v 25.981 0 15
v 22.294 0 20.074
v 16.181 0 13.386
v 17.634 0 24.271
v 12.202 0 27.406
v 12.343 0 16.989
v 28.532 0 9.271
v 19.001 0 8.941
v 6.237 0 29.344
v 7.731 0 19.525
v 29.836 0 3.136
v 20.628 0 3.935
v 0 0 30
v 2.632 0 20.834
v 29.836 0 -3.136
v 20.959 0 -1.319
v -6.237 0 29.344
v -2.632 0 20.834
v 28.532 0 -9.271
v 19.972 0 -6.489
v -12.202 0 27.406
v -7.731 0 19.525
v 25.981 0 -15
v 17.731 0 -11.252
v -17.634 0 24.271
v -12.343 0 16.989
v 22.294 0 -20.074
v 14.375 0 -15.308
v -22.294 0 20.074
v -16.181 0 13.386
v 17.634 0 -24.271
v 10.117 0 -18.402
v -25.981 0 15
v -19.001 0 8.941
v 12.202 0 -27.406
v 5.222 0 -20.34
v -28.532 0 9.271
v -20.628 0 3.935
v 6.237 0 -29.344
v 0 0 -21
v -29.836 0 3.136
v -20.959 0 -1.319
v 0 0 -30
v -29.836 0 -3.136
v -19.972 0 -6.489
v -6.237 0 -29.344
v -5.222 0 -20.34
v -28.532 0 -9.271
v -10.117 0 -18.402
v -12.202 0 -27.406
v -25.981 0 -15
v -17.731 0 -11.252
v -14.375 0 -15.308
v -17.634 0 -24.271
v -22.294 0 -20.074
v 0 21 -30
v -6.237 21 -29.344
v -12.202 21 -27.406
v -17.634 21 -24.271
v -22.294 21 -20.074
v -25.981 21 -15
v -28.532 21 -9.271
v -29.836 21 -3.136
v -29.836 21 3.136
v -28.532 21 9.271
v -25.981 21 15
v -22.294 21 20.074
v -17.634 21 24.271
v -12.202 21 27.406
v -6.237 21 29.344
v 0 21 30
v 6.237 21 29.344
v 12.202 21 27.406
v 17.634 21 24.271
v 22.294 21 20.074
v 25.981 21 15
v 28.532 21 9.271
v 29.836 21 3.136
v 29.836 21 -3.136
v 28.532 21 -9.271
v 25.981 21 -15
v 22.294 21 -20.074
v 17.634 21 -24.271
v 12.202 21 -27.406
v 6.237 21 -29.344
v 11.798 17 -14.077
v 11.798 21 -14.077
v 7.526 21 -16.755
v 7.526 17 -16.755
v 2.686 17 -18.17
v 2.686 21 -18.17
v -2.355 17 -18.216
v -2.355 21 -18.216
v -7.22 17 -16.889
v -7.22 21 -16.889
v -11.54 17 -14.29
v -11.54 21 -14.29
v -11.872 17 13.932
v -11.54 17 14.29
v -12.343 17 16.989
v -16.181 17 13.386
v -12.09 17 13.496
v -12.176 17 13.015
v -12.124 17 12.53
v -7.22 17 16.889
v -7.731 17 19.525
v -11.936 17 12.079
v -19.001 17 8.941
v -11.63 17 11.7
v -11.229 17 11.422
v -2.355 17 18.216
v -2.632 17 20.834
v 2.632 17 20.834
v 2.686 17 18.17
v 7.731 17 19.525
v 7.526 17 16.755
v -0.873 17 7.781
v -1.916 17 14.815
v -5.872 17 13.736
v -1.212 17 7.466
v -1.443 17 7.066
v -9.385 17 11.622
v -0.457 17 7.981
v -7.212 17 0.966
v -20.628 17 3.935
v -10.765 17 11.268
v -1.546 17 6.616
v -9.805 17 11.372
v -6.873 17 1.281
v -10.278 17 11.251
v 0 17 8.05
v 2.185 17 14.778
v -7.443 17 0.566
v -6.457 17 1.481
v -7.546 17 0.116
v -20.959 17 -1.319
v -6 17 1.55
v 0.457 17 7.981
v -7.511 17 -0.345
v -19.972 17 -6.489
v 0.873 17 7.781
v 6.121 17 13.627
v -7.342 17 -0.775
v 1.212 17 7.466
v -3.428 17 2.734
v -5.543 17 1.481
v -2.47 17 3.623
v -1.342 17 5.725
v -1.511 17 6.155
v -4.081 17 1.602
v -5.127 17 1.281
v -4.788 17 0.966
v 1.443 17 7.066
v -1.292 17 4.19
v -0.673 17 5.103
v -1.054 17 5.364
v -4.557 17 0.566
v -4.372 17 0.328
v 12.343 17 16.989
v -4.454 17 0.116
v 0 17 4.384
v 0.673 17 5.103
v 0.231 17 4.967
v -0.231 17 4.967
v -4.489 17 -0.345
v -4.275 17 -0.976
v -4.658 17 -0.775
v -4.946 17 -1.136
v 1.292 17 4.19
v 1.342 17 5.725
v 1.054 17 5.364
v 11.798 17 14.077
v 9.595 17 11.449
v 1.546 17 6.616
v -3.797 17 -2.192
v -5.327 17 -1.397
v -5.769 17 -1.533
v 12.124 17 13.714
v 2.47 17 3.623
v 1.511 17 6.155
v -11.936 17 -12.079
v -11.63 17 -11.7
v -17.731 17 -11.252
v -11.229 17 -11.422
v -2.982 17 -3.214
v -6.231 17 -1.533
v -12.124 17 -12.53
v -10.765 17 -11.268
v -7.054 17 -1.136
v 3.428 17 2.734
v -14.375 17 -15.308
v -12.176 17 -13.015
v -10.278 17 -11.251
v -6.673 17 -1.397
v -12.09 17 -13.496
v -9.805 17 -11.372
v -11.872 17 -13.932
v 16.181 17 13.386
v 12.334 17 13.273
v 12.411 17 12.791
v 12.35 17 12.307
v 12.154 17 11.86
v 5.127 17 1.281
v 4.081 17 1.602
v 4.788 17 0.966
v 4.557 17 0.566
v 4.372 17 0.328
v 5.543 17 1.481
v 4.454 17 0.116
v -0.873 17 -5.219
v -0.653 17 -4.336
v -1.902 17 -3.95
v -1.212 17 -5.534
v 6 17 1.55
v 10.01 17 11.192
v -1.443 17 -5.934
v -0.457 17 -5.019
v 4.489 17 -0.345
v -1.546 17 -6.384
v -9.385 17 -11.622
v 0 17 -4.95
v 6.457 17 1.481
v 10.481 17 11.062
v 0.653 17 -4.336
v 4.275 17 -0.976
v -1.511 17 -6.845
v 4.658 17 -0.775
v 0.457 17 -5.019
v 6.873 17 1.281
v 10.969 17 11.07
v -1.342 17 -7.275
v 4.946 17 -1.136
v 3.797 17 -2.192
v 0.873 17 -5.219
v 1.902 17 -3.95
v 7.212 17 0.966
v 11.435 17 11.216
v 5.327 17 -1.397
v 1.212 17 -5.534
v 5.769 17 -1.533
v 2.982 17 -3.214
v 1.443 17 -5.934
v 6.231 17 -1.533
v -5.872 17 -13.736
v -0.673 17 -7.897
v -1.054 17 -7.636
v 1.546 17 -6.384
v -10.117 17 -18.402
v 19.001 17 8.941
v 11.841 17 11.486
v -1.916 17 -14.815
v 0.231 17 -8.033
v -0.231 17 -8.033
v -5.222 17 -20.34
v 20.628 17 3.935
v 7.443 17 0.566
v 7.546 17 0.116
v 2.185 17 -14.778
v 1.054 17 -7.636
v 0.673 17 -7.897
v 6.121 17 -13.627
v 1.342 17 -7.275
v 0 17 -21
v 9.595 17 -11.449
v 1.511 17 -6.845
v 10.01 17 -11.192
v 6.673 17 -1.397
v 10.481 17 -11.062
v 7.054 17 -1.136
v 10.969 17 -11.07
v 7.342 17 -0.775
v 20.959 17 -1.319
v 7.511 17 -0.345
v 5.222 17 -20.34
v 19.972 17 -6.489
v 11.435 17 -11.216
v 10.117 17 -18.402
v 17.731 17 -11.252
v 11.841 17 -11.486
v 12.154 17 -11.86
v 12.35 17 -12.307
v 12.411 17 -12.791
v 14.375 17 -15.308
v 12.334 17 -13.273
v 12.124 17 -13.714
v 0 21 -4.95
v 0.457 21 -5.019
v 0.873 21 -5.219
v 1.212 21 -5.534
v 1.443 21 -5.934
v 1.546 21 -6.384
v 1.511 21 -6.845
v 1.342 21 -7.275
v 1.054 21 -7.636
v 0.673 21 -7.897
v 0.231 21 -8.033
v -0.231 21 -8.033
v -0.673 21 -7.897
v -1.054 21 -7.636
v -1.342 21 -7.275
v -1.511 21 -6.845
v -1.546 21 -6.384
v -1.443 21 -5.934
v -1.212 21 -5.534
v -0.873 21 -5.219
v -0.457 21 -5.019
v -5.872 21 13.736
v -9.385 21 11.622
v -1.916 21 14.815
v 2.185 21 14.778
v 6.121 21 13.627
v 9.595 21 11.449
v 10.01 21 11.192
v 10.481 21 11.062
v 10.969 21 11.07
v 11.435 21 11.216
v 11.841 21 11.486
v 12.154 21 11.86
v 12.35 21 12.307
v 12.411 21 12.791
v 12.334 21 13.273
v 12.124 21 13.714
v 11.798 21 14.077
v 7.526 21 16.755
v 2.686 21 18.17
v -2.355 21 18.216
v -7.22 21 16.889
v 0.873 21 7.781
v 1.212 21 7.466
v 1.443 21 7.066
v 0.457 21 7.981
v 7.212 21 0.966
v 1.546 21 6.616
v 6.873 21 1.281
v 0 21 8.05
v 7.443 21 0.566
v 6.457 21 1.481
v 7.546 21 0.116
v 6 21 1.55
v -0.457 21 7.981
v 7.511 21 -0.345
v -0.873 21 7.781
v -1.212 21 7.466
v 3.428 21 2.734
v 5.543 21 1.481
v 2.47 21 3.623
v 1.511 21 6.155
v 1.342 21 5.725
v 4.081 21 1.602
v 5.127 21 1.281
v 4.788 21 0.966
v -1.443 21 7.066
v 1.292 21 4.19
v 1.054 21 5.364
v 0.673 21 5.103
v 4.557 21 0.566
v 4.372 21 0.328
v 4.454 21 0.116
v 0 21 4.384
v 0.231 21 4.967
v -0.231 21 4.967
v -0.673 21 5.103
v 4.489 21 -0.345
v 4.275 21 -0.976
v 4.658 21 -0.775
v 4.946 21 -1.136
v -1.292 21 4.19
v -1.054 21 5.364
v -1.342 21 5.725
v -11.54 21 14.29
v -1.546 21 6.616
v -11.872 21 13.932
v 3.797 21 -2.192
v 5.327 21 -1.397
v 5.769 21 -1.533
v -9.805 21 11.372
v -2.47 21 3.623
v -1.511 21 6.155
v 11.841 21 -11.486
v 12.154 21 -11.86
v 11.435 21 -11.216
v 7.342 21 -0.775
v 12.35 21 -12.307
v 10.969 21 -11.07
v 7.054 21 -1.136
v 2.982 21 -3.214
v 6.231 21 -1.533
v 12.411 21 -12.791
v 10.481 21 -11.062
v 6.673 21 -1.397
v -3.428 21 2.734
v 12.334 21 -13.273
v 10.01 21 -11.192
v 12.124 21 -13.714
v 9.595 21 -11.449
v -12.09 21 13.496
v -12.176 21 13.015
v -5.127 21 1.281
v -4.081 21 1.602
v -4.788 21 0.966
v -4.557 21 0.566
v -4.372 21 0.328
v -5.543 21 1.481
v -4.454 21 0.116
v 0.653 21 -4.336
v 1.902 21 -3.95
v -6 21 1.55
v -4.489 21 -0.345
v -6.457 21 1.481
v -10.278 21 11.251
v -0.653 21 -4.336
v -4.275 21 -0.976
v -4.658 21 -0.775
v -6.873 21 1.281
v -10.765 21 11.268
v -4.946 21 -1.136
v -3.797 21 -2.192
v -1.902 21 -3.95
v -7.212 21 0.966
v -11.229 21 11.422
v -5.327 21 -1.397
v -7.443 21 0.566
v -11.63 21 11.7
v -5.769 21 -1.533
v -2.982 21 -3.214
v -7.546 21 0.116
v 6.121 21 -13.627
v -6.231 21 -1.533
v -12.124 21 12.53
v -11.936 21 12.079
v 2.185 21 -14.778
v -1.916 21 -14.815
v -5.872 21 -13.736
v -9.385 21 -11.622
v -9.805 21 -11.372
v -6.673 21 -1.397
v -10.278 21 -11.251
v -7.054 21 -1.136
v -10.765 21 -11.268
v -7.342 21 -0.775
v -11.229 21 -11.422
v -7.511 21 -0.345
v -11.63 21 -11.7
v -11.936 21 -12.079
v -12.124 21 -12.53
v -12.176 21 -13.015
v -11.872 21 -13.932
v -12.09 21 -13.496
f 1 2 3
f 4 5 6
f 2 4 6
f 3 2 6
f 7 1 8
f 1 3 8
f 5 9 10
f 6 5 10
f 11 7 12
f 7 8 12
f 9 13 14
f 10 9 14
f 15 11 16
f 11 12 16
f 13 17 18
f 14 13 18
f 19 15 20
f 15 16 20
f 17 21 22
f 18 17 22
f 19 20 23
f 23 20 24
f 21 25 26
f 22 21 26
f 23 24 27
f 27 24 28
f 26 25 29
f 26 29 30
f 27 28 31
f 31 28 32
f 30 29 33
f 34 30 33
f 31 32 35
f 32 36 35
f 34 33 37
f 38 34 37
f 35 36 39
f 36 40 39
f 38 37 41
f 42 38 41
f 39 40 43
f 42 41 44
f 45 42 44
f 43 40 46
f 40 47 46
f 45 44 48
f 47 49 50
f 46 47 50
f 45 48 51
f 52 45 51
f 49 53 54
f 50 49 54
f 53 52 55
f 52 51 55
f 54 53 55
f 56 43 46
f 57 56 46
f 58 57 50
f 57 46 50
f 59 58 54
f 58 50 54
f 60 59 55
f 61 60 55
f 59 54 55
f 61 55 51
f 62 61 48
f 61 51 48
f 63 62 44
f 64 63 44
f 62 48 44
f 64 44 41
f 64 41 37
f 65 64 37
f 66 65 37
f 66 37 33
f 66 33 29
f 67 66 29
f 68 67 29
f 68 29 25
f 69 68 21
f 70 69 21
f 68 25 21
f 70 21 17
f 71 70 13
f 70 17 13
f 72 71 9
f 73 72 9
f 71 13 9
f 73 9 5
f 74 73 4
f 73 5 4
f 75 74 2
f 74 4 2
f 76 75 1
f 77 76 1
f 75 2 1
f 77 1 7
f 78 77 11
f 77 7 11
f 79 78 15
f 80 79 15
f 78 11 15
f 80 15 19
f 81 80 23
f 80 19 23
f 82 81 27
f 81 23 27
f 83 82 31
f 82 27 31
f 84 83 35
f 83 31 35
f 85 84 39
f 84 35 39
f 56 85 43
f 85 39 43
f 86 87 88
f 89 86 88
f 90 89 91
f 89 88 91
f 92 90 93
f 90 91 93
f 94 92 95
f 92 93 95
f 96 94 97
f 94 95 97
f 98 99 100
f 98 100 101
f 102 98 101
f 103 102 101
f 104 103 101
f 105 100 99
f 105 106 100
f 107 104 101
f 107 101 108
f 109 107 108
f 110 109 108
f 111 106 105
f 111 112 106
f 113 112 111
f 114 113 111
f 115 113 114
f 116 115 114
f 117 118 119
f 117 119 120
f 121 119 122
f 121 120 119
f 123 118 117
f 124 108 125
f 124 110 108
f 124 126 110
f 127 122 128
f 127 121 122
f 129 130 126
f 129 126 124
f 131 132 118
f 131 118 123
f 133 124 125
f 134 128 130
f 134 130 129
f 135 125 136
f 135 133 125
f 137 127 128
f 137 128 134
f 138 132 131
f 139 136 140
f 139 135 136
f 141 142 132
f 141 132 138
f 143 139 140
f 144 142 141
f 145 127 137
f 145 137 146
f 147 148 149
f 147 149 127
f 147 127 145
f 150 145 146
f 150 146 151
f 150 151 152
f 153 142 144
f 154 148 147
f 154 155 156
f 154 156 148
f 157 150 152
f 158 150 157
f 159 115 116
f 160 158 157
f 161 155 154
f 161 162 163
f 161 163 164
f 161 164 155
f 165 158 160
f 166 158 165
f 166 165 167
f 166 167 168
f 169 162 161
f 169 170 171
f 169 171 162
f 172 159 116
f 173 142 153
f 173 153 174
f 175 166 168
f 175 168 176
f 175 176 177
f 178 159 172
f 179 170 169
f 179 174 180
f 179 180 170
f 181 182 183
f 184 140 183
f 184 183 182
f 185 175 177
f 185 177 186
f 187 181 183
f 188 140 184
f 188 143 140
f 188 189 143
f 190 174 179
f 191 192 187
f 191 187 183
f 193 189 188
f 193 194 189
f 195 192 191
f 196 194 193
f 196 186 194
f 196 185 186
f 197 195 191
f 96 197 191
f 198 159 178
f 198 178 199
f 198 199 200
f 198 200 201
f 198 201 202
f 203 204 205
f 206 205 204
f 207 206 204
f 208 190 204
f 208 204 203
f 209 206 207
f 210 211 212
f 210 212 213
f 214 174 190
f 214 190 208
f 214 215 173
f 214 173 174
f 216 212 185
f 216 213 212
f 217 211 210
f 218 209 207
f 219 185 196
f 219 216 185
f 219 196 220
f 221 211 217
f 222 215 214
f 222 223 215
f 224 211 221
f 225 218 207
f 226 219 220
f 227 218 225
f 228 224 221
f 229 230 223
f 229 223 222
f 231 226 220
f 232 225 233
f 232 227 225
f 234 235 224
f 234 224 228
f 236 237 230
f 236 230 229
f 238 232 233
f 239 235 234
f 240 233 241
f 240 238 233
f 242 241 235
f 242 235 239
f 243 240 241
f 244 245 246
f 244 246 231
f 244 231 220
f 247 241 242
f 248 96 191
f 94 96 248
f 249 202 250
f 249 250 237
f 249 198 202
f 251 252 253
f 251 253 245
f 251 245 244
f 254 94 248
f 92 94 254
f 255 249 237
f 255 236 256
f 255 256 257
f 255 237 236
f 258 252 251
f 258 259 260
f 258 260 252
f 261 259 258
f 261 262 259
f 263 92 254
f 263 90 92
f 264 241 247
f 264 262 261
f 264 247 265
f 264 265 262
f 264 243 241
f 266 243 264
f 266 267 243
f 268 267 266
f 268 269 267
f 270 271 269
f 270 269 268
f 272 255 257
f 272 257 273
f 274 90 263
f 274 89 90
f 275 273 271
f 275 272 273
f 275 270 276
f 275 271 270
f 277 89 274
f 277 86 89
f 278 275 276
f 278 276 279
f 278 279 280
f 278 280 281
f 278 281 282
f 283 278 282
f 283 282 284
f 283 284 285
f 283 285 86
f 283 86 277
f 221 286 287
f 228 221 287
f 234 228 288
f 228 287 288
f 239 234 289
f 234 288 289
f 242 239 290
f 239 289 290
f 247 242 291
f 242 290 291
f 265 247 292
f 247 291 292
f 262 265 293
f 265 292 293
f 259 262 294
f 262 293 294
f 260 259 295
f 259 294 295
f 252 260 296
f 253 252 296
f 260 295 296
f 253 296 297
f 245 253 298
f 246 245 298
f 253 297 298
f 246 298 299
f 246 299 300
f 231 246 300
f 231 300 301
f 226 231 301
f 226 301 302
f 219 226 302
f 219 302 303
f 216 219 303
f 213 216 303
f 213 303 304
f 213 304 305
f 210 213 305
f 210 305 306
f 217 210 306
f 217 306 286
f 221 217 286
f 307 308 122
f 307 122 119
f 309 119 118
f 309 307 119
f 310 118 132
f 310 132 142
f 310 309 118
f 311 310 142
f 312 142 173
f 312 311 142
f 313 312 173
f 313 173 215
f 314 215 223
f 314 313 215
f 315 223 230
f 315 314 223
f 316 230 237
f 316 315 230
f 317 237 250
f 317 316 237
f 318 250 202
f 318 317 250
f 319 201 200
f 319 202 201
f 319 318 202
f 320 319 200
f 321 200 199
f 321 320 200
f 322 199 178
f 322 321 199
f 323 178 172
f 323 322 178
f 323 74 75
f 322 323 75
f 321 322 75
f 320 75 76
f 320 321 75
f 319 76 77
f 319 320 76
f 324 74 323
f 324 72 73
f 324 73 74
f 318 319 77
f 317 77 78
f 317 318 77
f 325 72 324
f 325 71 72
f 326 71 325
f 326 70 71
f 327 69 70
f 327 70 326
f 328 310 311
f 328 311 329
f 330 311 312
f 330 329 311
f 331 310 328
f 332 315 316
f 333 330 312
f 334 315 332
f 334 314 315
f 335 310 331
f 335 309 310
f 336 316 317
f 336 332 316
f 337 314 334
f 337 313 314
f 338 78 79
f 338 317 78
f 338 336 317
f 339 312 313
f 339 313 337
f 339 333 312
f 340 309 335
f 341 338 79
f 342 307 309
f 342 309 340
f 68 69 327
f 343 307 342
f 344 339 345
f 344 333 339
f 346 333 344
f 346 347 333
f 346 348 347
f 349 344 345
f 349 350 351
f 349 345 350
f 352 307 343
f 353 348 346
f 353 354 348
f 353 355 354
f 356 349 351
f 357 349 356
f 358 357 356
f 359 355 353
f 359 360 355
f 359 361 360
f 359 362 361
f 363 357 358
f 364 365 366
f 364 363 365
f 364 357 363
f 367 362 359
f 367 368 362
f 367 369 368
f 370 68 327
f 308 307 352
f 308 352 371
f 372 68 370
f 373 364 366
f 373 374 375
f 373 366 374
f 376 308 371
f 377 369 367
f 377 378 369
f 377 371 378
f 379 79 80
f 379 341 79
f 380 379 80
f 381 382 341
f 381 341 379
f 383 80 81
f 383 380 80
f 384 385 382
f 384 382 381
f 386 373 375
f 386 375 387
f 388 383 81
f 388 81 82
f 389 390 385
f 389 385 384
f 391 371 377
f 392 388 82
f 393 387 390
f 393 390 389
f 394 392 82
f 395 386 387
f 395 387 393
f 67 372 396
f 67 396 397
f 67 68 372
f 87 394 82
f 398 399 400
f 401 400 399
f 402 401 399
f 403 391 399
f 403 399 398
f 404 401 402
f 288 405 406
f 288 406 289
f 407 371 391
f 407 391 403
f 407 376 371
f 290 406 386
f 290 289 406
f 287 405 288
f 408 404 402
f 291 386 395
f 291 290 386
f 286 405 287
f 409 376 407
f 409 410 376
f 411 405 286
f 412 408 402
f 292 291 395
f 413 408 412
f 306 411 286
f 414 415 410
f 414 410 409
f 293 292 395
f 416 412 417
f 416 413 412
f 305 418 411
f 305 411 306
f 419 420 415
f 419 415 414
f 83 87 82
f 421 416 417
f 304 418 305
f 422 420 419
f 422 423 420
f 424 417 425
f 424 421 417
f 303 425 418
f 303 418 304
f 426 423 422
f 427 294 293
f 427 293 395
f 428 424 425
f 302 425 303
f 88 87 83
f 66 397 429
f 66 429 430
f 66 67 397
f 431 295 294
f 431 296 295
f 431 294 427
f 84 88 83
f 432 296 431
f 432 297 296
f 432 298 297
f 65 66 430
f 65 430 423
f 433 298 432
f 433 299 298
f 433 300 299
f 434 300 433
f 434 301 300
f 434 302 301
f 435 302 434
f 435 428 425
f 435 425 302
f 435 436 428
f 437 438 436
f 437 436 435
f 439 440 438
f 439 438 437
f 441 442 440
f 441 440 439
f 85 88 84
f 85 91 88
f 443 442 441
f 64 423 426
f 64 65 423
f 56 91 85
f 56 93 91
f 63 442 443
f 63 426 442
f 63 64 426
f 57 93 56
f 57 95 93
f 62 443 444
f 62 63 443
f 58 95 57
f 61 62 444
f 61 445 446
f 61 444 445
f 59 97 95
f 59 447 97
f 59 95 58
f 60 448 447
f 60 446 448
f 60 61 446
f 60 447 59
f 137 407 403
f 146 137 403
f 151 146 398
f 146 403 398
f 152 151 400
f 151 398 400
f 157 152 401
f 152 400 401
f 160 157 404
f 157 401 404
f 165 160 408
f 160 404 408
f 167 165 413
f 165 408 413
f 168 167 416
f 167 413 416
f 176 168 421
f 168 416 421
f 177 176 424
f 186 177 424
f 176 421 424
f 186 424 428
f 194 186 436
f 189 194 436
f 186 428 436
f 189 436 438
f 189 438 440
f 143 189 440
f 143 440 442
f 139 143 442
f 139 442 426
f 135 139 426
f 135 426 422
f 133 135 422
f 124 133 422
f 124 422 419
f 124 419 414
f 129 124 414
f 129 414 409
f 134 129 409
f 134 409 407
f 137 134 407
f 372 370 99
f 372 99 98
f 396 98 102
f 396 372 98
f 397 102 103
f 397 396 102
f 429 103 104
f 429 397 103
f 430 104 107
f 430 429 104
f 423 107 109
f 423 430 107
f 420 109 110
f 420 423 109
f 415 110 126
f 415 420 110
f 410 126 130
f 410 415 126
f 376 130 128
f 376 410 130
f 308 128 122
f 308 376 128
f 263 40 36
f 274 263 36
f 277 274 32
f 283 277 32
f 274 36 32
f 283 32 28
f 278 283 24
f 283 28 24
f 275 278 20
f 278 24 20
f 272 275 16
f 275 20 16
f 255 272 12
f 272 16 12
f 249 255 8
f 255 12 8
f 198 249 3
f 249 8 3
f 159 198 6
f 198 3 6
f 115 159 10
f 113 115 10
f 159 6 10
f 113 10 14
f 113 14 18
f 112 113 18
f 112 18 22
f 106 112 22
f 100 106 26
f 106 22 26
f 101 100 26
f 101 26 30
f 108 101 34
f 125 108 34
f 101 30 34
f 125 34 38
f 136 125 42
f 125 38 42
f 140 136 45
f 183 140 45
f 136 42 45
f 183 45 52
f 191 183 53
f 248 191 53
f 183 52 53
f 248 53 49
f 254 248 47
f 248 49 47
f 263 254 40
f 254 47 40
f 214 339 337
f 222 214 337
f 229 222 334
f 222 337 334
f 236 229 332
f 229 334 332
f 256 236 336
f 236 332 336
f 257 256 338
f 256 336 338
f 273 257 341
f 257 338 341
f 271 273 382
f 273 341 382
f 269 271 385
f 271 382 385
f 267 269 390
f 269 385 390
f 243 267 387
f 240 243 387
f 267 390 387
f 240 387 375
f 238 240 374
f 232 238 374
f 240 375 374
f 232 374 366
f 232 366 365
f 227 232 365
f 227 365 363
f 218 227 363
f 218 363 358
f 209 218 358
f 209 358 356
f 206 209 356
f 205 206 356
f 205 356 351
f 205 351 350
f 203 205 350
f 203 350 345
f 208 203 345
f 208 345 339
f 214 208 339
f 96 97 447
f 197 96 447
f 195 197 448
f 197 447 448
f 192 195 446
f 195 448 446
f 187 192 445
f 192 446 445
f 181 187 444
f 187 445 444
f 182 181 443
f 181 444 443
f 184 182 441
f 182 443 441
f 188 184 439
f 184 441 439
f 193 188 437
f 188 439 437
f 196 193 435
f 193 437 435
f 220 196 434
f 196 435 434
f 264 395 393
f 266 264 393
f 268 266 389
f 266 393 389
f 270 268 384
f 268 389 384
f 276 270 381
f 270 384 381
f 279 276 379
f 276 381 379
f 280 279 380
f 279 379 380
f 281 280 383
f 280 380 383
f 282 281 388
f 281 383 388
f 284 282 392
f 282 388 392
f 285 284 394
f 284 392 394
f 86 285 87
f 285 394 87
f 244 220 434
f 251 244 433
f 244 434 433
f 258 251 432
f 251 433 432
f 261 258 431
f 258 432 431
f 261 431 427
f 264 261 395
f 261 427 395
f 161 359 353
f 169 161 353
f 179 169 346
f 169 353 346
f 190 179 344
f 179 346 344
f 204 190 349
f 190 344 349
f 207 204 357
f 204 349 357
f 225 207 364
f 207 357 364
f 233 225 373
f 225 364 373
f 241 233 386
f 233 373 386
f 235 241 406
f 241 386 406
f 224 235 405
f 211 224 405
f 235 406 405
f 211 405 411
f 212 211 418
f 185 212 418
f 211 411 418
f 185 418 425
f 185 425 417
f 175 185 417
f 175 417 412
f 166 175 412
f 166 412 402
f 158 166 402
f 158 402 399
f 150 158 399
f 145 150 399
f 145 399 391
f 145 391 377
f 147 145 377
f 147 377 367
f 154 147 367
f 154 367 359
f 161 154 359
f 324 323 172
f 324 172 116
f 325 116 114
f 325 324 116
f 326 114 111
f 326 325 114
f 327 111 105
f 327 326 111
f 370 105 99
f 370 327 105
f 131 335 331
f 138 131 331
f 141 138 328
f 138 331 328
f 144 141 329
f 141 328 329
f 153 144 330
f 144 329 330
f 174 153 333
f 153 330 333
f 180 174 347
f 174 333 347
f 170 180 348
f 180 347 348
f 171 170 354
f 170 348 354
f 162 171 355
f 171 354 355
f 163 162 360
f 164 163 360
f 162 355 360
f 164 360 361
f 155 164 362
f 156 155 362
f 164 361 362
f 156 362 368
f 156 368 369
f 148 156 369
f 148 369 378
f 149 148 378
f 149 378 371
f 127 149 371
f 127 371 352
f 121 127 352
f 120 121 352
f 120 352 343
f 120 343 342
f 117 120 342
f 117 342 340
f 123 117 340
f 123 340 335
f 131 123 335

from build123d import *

# Parameters (mm, degrees)
SKETCH_1_R          = 30
EXTRUDE_1_DEPTH     = 21
SKETCH_2_R          = 21
CUT_EXTRUDE_1_DEPTH = 17
SKETCH_4_R          = 1.55
SKETCH_4_R_2        = 4.384489401
CUT_EXTRUDE_3_DEPTH = 17


with BuildPart() as part:
    # 草图1 → 凸台-拉伸1 (new body)
    with BuildSketch(Plane(origin=(0, 0, 0), x_dir=(1, 0, 0), z_dir=(0, 1, 0))):
        with Locations(Location((0, 0, 0), (0, 0, 90))):
            Circle(SKETCH_1_R)
    extrude(amount=EXTRUDE_1_DEPTH)

    # 草图2 → 切除-拉伸1 (cut)
    with BuildSketch(Plane.XZ):
        with Locations(Location((0, 0, 0), (0, 0, 270))):
            Circle(SKETCH_2_R)
    extrude(amount=-CUT_EXTRUDE_1_DEPTH, mode=Mode.SUBTRACT)

    # 草图4 → 切除-拉伸3 (cut)
    with BuildSketch(Plane(origin=(0, 21, 0), x_dir=(1, 0, 0), z_dir=(0, 1, 0))):
        with Locations(Location((-6, 0, 0), (0, 0, 270))):
            Circle(SKETCH_4_R)
        with Locations(Location((0, 6.5, 0), (0, 0, 270))):
            Circle(SKETCH_4_R)
        with Locations(Location((6, 0, 0), (0, 0, 270))):
            Circle(SKETCH_4_R)
        with Locations(Location((0, -6.5, 0), (0, 0, 270))):
            Circle(SKETCH_4_R)
        with Locations(Location((0, 0, 0), (0, 0, 270))):
            Circle(SKETCH_4_R_2)
        with BuildLine():
            ThreePointArc((11.79815708, 14.077346516), (0.167157726, 18.366824813), (-11.539986211, 14.289748551))
            ThreePointArc((-11.539986211, 14.289748551), (-11.796674112, 11.878565481), (-9.385491043, 11.62187758))
            ThreePointArc((-9.385491043, 11.62187758), (0.135949672, 14.93777086), (9.595461863, 11.449130632))
            ThreePointArc((9.595461863, 11.449130632), (12.010917413, 11.661890965), (11.79815708, 14.077346516))
        make_face()
        with BuildLine():
            ThreePointArc((11.79815708, -14.077346516), (0.167157726, -18.366824813), (-11.539986211, -14.289748551))
            ThreePointArc((-11.539986211, -14.289748551), (-11.796674112, -11.878565481), (-9.385491043, -11.62187758))
            ThreePointArc((-9.385491043, -11.62187758), (0.135949672, -14.93777086), (9.595461863, -11.449130632))
            ThreePointArc((9.595461863, -11.449130632), (12.010917413, -11.661890965), (11.79815708, -14.077346516))
        make_face()
    extrude(amount=-CUT_EXTRUDE_3_DEPTH, mode=Mode.SUBTRACT)


solid = part.part
